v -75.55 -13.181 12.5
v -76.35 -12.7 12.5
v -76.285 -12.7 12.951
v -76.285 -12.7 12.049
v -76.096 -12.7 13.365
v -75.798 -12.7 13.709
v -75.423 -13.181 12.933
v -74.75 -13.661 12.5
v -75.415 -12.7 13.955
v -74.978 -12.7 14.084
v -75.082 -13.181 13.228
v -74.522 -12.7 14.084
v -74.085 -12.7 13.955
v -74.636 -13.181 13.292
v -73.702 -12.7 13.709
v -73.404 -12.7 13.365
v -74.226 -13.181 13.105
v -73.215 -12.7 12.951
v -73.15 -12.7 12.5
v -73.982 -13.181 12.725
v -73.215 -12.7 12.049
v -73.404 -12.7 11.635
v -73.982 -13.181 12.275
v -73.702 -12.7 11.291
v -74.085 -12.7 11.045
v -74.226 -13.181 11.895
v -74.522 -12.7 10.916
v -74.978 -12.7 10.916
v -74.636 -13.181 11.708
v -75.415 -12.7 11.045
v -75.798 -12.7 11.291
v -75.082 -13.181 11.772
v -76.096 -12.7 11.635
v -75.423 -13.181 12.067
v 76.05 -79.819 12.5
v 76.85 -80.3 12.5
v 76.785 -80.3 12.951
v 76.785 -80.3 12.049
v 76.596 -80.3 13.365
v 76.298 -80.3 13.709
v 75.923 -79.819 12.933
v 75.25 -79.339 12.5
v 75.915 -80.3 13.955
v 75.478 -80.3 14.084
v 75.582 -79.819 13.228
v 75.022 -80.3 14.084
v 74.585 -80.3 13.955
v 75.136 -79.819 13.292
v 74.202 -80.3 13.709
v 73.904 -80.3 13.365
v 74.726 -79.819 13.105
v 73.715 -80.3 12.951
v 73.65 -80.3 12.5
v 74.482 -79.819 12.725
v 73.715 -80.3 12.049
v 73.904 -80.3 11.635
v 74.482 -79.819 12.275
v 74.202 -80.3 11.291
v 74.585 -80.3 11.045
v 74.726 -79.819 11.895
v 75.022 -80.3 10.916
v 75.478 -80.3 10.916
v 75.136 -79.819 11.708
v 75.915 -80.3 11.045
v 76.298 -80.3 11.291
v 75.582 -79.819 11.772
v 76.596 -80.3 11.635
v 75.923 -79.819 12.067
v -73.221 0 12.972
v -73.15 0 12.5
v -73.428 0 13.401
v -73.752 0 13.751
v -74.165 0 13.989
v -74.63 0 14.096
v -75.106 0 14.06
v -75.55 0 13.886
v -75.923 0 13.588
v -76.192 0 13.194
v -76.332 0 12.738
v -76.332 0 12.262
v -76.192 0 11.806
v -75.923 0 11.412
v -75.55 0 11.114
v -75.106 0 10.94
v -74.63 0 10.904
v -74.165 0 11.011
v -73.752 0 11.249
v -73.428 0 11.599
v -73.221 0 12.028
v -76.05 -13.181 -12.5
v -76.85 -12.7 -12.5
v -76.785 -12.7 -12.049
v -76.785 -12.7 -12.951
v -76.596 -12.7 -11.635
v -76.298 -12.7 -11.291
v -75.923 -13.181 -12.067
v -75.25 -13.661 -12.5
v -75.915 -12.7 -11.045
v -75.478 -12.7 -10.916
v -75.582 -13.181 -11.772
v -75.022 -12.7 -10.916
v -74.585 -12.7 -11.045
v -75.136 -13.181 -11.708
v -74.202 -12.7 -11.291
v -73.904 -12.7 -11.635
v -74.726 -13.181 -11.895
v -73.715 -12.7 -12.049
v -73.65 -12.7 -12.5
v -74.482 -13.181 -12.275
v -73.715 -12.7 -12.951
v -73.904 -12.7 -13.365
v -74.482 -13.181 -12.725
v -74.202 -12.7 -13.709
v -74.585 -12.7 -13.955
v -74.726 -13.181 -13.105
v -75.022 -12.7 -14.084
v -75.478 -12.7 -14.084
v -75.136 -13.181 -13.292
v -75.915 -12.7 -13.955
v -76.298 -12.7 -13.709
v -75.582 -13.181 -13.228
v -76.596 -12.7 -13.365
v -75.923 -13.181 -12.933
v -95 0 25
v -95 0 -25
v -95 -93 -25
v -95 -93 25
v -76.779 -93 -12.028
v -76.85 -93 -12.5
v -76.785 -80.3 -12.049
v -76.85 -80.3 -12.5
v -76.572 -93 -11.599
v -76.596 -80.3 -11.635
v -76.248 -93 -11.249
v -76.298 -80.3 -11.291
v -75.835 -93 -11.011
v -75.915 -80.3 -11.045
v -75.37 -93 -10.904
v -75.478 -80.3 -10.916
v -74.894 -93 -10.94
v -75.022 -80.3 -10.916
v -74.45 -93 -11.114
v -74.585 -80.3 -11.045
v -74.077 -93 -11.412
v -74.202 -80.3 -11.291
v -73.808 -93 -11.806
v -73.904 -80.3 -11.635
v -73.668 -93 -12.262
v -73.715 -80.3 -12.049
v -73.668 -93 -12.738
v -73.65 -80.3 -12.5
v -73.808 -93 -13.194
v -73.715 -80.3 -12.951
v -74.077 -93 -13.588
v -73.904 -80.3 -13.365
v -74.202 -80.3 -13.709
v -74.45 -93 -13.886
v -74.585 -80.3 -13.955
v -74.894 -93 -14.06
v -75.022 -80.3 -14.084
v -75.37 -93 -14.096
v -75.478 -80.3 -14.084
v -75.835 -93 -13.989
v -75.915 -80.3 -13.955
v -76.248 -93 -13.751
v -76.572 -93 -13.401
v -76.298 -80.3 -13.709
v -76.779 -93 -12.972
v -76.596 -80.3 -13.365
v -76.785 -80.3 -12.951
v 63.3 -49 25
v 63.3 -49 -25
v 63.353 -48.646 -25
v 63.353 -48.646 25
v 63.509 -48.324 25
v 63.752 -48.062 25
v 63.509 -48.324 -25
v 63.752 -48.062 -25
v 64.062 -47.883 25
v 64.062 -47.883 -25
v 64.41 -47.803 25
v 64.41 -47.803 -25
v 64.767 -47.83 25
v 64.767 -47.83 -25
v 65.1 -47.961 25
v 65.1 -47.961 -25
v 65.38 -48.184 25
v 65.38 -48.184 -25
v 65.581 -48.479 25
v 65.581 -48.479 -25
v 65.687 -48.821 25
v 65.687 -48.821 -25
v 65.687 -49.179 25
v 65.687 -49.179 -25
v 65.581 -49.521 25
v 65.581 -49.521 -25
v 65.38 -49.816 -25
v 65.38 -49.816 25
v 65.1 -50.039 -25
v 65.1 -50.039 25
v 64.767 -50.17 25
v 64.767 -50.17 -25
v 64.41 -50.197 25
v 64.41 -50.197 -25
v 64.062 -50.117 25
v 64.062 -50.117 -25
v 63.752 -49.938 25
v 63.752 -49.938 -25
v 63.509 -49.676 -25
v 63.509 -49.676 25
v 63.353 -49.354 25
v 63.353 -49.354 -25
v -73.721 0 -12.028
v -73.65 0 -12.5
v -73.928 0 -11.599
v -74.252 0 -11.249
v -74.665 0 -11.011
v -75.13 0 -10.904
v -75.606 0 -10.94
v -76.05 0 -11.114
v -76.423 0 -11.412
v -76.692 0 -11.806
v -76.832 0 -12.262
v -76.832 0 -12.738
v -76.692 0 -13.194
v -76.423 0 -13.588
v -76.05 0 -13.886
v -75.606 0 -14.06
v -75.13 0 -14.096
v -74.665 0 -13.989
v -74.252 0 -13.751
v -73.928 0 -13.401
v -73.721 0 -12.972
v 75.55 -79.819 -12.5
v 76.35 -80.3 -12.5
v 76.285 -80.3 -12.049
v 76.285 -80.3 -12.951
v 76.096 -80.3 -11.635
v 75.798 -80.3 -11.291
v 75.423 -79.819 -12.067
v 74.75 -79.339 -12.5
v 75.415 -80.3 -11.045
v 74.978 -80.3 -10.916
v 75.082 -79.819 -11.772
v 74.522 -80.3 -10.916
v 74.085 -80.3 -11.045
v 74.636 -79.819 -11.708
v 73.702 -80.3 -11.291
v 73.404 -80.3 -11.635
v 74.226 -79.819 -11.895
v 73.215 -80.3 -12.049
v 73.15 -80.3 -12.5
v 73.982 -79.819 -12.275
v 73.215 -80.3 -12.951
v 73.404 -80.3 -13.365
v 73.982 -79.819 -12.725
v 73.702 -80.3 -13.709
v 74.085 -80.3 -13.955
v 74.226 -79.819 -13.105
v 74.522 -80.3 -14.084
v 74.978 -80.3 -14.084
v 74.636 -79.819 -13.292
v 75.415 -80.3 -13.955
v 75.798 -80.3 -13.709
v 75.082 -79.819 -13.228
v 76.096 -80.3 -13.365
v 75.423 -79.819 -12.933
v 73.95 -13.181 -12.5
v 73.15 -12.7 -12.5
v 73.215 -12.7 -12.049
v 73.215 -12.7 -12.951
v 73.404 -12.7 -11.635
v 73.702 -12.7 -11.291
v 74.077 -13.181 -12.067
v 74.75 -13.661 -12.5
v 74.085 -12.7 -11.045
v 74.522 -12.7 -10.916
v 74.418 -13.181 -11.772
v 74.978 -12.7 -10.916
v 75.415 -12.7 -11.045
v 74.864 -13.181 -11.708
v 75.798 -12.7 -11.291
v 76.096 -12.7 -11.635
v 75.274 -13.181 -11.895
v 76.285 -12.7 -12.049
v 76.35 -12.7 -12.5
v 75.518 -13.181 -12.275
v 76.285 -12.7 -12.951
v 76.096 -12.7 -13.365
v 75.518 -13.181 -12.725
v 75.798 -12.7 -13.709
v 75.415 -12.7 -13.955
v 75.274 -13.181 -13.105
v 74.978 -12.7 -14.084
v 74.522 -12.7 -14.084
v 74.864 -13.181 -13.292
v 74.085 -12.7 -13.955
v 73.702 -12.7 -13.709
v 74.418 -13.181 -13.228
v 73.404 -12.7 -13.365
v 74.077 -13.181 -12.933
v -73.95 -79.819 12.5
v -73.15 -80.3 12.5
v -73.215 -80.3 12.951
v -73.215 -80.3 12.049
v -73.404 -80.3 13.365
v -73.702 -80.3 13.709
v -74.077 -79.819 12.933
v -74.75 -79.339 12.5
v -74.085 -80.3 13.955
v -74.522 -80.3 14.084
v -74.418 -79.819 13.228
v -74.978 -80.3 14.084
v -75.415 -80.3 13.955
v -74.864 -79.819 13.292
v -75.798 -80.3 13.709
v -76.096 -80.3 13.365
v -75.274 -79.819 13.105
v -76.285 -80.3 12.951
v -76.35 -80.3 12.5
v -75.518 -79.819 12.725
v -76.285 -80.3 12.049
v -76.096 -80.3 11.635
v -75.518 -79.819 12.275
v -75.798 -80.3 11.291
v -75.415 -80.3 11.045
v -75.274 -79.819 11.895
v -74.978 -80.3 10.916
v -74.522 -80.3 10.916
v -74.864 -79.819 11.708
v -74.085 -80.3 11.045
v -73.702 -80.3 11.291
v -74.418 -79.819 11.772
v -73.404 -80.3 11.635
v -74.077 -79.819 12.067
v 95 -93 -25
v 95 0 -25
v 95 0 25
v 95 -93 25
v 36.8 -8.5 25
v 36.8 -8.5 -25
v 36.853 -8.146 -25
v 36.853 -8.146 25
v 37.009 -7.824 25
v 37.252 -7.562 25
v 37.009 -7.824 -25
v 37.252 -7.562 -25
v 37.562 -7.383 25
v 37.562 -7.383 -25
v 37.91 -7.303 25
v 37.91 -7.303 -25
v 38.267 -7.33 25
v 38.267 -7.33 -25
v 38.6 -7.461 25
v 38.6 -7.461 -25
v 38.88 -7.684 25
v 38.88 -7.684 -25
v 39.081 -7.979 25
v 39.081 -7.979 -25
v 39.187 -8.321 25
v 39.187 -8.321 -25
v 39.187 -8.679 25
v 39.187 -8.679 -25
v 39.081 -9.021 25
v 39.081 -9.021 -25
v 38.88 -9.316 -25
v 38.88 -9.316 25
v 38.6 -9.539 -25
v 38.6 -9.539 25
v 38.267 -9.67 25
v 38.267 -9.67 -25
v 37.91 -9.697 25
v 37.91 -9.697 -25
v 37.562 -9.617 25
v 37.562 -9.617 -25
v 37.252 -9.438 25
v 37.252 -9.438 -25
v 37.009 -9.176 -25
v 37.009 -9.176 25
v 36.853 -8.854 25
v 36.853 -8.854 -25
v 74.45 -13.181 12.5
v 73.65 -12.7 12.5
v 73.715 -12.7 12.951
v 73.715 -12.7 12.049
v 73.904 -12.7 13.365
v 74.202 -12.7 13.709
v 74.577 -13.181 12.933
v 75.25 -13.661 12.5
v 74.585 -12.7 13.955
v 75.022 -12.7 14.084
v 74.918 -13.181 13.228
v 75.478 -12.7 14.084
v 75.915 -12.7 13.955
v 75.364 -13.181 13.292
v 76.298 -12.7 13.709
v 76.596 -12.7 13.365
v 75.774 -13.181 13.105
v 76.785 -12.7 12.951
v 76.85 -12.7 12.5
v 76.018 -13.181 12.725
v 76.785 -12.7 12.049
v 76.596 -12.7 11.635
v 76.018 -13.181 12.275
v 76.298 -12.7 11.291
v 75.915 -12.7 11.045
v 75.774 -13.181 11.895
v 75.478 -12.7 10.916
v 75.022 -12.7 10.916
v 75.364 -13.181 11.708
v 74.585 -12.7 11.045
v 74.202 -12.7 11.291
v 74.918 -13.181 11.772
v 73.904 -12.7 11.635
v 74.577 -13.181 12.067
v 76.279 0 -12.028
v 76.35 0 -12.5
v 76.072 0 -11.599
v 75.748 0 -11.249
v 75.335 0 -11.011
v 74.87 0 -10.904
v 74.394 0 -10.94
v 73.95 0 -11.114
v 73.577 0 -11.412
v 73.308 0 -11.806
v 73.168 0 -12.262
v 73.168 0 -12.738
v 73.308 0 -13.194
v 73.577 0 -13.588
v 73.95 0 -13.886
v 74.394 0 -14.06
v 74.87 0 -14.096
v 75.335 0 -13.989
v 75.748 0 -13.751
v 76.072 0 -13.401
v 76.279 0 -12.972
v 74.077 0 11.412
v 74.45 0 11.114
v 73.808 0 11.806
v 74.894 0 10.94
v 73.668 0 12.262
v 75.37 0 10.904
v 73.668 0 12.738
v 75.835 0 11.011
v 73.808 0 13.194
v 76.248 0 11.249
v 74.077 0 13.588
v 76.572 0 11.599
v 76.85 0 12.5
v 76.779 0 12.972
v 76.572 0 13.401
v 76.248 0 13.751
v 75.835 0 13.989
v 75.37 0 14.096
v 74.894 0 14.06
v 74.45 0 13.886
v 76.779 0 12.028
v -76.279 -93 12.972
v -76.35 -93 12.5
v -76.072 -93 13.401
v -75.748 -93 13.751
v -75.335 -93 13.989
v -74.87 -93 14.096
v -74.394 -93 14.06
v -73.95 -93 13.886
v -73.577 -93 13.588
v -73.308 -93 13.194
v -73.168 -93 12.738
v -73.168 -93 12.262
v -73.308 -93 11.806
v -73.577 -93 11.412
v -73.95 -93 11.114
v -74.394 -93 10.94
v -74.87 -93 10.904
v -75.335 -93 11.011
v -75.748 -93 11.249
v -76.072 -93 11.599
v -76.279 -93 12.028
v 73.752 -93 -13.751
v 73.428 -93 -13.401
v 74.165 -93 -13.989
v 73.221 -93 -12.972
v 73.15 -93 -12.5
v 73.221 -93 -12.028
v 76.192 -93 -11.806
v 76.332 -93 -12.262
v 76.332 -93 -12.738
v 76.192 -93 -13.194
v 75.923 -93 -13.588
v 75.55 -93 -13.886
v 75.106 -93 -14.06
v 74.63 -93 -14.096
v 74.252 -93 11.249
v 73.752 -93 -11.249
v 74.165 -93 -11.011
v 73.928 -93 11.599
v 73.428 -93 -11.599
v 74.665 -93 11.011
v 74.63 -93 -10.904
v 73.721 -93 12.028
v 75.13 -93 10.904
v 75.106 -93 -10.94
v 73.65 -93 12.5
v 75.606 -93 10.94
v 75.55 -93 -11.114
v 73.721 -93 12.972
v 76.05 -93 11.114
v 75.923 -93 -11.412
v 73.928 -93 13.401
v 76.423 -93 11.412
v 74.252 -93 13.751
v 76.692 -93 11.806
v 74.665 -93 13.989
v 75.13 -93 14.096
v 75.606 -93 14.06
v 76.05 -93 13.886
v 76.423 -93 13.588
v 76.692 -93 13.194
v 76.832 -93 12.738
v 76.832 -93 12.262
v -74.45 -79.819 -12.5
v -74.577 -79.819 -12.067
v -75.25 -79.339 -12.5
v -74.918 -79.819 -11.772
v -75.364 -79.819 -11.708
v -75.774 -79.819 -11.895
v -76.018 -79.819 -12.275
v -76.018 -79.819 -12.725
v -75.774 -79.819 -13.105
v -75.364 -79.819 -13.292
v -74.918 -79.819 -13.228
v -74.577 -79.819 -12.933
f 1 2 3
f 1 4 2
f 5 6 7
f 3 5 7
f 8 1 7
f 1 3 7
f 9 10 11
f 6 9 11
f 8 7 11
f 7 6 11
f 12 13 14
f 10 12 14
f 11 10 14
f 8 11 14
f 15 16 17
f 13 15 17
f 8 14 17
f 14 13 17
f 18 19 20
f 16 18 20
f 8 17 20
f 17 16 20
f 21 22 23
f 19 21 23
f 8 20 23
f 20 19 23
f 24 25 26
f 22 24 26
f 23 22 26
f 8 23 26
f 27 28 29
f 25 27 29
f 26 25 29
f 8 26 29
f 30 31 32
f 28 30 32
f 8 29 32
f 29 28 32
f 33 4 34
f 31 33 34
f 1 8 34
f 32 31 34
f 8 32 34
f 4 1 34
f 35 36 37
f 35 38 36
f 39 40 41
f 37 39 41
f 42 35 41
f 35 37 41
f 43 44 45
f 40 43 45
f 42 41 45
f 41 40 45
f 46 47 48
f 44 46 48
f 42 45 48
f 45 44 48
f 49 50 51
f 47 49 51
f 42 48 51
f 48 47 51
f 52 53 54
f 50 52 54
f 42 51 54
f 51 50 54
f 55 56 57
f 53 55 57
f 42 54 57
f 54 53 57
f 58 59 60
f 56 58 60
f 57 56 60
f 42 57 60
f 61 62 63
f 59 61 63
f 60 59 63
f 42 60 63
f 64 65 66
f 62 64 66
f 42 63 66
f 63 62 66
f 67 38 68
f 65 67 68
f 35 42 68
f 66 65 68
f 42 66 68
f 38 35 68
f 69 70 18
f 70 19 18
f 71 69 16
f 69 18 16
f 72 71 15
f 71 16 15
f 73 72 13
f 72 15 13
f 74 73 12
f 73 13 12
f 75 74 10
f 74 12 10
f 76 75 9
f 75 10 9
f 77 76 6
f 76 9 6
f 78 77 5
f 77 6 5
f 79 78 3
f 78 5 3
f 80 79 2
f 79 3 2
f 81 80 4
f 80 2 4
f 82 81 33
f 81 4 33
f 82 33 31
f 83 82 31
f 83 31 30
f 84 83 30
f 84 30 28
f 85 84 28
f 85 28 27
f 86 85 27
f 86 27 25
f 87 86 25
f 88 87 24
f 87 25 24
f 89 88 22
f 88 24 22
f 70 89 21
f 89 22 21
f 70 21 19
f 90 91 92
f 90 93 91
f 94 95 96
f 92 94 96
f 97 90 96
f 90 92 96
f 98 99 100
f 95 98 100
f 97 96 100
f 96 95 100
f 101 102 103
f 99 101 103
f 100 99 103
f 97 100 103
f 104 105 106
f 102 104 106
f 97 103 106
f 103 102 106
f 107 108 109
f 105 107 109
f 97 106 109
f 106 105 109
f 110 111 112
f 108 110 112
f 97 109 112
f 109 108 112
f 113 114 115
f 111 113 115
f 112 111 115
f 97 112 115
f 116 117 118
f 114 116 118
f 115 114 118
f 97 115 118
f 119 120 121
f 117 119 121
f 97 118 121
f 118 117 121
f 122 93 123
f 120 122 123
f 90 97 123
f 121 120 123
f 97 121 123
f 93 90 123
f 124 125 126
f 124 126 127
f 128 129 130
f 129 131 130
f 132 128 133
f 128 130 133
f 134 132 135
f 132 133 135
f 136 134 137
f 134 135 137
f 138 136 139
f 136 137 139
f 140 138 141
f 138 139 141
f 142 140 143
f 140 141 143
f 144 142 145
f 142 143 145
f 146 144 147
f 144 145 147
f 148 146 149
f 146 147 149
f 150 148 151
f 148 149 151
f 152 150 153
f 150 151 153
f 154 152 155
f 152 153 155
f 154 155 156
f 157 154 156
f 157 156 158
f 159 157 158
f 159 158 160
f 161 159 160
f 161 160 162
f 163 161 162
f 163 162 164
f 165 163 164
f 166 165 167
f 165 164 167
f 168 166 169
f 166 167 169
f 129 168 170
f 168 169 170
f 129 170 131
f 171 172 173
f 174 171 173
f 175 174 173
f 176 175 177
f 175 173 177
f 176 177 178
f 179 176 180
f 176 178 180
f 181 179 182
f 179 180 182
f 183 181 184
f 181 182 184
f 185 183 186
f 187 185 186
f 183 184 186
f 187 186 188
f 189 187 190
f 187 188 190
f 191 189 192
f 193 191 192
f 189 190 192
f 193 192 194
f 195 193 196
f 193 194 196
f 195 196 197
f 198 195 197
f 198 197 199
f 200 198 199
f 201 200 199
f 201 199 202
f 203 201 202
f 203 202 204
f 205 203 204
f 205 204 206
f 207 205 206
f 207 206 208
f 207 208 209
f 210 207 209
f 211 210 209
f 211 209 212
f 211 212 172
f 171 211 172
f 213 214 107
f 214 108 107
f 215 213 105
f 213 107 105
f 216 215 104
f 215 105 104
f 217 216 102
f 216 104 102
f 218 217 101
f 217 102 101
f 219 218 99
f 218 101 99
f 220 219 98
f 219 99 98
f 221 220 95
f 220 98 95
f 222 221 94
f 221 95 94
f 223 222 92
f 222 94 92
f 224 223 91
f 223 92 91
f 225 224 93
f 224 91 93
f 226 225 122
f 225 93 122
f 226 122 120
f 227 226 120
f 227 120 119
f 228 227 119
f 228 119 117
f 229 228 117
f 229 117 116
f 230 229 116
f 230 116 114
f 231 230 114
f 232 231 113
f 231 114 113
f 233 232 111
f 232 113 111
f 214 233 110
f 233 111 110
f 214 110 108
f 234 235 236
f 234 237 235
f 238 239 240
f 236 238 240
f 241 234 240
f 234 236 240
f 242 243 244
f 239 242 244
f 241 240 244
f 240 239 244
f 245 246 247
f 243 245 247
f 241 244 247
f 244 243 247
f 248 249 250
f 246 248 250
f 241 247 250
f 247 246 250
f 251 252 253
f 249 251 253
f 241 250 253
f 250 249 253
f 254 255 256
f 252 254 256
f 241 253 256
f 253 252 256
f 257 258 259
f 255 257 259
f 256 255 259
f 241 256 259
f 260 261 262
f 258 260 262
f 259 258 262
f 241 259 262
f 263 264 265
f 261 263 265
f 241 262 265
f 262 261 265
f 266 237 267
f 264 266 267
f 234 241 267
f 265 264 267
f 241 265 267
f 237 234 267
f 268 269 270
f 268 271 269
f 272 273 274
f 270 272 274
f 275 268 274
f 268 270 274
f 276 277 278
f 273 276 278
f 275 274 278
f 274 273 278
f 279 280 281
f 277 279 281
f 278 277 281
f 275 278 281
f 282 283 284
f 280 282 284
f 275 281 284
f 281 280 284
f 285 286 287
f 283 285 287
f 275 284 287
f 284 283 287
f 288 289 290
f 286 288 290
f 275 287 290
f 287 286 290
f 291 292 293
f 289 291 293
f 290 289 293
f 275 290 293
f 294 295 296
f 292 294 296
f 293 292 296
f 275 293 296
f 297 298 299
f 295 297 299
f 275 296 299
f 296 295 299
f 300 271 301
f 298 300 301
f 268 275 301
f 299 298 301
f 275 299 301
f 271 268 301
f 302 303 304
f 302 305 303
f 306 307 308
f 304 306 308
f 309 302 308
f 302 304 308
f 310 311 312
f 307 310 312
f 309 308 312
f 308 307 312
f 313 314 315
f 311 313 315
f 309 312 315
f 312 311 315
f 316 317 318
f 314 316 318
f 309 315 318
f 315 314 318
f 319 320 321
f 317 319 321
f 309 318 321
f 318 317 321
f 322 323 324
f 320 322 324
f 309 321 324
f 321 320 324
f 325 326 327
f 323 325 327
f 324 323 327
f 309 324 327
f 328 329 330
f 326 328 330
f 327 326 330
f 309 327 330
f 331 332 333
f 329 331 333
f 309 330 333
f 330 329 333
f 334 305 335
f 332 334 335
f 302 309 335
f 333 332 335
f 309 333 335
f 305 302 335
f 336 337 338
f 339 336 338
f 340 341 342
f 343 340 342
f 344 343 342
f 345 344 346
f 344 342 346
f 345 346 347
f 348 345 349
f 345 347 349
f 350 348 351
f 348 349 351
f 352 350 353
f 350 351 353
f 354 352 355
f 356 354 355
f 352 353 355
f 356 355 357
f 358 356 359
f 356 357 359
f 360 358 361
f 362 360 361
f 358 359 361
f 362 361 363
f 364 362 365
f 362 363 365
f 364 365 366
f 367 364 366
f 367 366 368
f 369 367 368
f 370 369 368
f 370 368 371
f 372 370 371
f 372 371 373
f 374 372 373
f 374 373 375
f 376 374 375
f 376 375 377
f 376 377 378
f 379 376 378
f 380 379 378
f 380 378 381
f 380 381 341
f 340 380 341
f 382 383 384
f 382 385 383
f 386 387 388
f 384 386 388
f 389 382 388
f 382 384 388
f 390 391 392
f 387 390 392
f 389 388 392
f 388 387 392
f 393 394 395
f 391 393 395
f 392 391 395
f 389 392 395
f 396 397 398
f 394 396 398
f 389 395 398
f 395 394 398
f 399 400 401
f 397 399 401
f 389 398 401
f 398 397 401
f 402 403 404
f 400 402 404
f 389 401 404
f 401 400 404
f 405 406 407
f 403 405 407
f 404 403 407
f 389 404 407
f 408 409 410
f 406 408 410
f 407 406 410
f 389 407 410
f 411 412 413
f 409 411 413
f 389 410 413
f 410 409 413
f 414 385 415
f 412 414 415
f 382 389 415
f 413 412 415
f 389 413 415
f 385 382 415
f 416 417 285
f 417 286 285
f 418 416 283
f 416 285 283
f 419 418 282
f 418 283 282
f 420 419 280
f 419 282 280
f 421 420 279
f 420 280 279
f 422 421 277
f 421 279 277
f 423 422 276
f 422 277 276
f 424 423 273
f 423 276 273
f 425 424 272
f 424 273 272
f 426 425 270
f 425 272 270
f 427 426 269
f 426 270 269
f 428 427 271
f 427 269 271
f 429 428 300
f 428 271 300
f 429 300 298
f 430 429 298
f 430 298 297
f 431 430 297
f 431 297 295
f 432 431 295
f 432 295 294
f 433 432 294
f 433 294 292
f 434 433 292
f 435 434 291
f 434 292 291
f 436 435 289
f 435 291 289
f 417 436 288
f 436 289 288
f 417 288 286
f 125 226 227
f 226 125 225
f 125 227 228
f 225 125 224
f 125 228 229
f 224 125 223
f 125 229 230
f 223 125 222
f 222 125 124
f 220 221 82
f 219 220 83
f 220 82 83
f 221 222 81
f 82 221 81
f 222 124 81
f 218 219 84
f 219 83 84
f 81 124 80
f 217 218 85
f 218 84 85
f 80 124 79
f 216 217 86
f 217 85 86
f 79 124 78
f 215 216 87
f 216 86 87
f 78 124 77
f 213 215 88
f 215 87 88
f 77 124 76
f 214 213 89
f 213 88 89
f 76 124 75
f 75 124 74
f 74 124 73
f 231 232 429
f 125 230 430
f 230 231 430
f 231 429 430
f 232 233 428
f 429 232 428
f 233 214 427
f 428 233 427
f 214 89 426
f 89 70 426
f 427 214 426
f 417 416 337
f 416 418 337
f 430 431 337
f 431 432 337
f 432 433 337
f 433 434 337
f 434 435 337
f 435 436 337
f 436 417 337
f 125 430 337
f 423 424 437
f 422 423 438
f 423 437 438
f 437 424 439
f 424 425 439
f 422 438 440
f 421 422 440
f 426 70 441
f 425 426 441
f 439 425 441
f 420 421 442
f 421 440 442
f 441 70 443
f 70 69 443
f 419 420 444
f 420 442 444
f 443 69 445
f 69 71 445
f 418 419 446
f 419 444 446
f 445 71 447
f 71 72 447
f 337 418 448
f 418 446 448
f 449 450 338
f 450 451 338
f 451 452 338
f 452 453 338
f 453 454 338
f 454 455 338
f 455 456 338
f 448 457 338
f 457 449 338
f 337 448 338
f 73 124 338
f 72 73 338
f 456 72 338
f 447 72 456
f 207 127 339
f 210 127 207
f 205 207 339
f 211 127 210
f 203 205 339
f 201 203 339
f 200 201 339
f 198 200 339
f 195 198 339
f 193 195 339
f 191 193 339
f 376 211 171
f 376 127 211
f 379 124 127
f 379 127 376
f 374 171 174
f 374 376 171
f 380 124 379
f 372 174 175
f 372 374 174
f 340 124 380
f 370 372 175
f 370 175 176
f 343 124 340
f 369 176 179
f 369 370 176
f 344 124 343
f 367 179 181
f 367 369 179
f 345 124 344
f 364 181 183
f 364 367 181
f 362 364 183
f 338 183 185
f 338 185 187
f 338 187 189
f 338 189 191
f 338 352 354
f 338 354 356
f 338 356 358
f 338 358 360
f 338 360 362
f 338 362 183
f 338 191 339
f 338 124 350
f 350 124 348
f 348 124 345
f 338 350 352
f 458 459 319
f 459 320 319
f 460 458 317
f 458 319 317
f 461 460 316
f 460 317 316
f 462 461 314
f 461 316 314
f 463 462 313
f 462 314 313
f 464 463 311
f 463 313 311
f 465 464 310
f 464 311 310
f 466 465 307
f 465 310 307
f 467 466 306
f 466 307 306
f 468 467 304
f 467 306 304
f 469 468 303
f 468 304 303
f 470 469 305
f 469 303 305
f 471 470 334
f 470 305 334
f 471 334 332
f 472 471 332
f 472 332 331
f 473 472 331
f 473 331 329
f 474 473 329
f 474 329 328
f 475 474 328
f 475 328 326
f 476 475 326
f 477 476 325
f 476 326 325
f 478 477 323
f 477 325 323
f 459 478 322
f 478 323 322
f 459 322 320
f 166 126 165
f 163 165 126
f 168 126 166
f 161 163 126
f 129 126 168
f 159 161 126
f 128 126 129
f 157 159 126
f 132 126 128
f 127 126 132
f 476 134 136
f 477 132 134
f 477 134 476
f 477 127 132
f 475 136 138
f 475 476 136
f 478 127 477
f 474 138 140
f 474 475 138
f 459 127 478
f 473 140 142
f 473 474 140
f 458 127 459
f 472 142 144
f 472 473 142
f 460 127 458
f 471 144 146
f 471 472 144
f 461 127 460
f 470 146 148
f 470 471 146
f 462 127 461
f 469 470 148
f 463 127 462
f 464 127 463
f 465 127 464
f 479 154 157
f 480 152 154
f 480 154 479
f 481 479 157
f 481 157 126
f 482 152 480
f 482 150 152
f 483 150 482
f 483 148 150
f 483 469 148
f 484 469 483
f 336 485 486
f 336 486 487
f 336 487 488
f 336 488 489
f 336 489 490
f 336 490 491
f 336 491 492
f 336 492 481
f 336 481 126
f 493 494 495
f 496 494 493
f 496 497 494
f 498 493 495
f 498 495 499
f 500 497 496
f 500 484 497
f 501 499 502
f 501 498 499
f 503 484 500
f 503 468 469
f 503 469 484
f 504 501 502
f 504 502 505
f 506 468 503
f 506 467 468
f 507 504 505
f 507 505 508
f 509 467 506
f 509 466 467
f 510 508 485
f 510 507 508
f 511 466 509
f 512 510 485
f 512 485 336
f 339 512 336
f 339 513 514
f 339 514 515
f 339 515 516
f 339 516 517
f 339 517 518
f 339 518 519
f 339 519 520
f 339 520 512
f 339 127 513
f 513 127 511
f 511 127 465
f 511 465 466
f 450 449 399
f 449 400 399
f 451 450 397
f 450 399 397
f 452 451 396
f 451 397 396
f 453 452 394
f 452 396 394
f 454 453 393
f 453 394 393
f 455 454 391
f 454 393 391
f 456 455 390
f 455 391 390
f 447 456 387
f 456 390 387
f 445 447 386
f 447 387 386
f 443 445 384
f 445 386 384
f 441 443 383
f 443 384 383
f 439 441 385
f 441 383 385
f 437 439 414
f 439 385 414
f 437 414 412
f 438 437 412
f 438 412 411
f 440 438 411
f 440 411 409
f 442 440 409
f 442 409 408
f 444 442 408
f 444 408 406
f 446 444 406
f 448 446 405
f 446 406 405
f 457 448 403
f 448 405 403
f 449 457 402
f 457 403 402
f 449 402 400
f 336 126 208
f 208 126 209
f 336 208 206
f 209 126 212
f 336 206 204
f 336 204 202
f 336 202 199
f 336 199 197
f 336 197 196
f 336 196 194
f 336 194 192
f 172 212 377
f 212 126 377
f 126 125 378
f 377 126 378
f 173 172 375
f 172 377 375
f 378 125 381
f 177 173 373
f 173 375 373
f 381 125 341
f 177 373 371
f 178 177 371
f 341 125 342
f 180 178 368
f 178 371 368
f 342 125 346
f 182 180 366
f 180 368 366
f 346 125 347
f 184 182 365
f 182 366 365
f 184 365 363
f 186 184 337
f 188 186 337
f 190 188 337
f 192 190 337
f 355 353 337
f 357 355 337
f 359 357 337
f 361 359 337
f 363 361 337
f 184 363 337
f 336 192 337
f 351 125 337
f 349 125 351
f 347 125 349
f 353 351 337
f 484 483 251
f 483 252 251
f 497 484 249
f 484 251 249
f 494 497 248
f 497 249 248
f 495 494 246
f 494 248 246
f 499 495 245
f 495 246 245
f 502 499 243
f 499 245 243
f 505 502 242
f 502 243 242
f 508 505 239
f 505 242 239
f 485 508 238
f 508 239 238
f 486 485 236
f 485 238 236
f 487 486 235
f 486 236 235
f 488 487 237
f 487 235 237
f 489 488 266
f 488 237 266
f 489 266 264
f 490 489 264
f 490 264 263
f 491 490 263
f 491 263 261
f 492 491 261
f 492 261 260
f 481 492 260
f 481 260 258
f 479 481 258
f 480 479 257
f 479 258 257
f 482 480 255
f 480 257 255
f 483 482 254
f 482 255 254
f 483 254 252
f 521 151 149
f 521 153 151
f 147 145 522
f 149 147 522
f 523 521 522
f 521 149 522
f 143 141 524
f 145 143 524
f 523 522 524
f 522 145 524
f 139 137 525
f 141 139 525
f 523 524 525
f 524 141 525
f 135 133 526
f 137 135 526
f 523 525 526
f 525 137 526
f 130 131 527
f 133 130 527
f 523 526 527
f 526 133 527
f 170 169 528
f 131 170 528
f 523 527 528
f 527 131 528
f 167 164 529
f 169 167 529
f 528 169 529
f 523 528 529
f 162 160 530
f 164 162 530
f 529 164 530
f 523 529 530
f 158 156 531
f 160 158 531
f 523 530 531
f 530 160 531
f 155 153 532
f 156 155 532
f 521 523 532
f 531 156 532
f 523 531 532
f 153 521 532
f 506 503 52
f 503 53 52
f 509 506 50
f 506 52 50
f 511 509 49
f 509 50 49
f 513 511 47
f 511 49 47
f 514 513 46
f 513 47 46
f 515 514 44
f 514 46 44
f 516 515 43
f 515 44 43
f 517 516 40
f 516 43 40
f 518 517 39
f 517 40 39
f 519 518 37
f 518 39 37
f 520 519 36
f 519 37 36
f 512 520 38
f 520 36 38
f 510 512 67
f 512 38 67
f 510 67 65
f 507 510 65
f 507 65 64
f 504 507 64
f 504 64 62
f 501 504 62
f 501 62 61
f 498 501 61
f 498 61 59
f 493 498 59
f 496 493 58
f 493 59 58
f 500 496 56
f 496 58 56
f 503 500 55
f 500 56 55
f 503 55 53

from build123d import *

# Parameters (mm, degrees)
F0_W     = 190
F0_H     = 50
F1_DEPTH = 93
F3_D     = 3.2
F3_DEPTH = 12.7
F3_TIP   = 0.9613769904
F5_D     = 3.2
F5_DEPTH = 12.7
F5_TIP   = 0.9613769904
F7_D     = 2.4


with BuildPart() as f1:
    # F0 (on Front) → F1 (new body)
    with BuildSketch(Plane.XZ):
        Rectangle(F0_W, F0_H)
    extrude(amount=F1_DEPTH)

    # F3
    with Locations(Plane.XZ.offset(93)):
        with Locations((-74.75, 12.5), (75.25, 12.5), (74.75, -12.5), (-75.25, -12.5)):
            Hole(F3_D / 2, depth=F3_DEPTH)
            with Locations((0, 0, -(F3_DEPTH + F3_TIP / 2))):  # 118° drill point
                Cone(0, F3_D / 2, F3_TIP, mode=Mode.SUBTRACT)

    # F5
    with Locations(Plane(origin=(0, 0, 0), x_dir=(-1, 0, 0), z_dir=(0, 1, 0))):
        with Locations((-75.25, 12.5), (74.75, 12.5), (75.25, -12.5), (-74.75, -12.5)):
            Hole(F5_D / 2, depth=F5_DEPTH)
            with Locations((0, 0, -(F5_DEPTH + F5_TIP / 2))):  # 118° drill point
                Cone(0, F5_D / 2, F5_TIP, mode=Mode.SUBTRACT)

    # F7 (through all)
    with Locations(Plane.XY.offset(25)):
        with Locations((38, -8.5), (64.5, -49)):
            Hole(F7_D / 2)


solid = f1.part
